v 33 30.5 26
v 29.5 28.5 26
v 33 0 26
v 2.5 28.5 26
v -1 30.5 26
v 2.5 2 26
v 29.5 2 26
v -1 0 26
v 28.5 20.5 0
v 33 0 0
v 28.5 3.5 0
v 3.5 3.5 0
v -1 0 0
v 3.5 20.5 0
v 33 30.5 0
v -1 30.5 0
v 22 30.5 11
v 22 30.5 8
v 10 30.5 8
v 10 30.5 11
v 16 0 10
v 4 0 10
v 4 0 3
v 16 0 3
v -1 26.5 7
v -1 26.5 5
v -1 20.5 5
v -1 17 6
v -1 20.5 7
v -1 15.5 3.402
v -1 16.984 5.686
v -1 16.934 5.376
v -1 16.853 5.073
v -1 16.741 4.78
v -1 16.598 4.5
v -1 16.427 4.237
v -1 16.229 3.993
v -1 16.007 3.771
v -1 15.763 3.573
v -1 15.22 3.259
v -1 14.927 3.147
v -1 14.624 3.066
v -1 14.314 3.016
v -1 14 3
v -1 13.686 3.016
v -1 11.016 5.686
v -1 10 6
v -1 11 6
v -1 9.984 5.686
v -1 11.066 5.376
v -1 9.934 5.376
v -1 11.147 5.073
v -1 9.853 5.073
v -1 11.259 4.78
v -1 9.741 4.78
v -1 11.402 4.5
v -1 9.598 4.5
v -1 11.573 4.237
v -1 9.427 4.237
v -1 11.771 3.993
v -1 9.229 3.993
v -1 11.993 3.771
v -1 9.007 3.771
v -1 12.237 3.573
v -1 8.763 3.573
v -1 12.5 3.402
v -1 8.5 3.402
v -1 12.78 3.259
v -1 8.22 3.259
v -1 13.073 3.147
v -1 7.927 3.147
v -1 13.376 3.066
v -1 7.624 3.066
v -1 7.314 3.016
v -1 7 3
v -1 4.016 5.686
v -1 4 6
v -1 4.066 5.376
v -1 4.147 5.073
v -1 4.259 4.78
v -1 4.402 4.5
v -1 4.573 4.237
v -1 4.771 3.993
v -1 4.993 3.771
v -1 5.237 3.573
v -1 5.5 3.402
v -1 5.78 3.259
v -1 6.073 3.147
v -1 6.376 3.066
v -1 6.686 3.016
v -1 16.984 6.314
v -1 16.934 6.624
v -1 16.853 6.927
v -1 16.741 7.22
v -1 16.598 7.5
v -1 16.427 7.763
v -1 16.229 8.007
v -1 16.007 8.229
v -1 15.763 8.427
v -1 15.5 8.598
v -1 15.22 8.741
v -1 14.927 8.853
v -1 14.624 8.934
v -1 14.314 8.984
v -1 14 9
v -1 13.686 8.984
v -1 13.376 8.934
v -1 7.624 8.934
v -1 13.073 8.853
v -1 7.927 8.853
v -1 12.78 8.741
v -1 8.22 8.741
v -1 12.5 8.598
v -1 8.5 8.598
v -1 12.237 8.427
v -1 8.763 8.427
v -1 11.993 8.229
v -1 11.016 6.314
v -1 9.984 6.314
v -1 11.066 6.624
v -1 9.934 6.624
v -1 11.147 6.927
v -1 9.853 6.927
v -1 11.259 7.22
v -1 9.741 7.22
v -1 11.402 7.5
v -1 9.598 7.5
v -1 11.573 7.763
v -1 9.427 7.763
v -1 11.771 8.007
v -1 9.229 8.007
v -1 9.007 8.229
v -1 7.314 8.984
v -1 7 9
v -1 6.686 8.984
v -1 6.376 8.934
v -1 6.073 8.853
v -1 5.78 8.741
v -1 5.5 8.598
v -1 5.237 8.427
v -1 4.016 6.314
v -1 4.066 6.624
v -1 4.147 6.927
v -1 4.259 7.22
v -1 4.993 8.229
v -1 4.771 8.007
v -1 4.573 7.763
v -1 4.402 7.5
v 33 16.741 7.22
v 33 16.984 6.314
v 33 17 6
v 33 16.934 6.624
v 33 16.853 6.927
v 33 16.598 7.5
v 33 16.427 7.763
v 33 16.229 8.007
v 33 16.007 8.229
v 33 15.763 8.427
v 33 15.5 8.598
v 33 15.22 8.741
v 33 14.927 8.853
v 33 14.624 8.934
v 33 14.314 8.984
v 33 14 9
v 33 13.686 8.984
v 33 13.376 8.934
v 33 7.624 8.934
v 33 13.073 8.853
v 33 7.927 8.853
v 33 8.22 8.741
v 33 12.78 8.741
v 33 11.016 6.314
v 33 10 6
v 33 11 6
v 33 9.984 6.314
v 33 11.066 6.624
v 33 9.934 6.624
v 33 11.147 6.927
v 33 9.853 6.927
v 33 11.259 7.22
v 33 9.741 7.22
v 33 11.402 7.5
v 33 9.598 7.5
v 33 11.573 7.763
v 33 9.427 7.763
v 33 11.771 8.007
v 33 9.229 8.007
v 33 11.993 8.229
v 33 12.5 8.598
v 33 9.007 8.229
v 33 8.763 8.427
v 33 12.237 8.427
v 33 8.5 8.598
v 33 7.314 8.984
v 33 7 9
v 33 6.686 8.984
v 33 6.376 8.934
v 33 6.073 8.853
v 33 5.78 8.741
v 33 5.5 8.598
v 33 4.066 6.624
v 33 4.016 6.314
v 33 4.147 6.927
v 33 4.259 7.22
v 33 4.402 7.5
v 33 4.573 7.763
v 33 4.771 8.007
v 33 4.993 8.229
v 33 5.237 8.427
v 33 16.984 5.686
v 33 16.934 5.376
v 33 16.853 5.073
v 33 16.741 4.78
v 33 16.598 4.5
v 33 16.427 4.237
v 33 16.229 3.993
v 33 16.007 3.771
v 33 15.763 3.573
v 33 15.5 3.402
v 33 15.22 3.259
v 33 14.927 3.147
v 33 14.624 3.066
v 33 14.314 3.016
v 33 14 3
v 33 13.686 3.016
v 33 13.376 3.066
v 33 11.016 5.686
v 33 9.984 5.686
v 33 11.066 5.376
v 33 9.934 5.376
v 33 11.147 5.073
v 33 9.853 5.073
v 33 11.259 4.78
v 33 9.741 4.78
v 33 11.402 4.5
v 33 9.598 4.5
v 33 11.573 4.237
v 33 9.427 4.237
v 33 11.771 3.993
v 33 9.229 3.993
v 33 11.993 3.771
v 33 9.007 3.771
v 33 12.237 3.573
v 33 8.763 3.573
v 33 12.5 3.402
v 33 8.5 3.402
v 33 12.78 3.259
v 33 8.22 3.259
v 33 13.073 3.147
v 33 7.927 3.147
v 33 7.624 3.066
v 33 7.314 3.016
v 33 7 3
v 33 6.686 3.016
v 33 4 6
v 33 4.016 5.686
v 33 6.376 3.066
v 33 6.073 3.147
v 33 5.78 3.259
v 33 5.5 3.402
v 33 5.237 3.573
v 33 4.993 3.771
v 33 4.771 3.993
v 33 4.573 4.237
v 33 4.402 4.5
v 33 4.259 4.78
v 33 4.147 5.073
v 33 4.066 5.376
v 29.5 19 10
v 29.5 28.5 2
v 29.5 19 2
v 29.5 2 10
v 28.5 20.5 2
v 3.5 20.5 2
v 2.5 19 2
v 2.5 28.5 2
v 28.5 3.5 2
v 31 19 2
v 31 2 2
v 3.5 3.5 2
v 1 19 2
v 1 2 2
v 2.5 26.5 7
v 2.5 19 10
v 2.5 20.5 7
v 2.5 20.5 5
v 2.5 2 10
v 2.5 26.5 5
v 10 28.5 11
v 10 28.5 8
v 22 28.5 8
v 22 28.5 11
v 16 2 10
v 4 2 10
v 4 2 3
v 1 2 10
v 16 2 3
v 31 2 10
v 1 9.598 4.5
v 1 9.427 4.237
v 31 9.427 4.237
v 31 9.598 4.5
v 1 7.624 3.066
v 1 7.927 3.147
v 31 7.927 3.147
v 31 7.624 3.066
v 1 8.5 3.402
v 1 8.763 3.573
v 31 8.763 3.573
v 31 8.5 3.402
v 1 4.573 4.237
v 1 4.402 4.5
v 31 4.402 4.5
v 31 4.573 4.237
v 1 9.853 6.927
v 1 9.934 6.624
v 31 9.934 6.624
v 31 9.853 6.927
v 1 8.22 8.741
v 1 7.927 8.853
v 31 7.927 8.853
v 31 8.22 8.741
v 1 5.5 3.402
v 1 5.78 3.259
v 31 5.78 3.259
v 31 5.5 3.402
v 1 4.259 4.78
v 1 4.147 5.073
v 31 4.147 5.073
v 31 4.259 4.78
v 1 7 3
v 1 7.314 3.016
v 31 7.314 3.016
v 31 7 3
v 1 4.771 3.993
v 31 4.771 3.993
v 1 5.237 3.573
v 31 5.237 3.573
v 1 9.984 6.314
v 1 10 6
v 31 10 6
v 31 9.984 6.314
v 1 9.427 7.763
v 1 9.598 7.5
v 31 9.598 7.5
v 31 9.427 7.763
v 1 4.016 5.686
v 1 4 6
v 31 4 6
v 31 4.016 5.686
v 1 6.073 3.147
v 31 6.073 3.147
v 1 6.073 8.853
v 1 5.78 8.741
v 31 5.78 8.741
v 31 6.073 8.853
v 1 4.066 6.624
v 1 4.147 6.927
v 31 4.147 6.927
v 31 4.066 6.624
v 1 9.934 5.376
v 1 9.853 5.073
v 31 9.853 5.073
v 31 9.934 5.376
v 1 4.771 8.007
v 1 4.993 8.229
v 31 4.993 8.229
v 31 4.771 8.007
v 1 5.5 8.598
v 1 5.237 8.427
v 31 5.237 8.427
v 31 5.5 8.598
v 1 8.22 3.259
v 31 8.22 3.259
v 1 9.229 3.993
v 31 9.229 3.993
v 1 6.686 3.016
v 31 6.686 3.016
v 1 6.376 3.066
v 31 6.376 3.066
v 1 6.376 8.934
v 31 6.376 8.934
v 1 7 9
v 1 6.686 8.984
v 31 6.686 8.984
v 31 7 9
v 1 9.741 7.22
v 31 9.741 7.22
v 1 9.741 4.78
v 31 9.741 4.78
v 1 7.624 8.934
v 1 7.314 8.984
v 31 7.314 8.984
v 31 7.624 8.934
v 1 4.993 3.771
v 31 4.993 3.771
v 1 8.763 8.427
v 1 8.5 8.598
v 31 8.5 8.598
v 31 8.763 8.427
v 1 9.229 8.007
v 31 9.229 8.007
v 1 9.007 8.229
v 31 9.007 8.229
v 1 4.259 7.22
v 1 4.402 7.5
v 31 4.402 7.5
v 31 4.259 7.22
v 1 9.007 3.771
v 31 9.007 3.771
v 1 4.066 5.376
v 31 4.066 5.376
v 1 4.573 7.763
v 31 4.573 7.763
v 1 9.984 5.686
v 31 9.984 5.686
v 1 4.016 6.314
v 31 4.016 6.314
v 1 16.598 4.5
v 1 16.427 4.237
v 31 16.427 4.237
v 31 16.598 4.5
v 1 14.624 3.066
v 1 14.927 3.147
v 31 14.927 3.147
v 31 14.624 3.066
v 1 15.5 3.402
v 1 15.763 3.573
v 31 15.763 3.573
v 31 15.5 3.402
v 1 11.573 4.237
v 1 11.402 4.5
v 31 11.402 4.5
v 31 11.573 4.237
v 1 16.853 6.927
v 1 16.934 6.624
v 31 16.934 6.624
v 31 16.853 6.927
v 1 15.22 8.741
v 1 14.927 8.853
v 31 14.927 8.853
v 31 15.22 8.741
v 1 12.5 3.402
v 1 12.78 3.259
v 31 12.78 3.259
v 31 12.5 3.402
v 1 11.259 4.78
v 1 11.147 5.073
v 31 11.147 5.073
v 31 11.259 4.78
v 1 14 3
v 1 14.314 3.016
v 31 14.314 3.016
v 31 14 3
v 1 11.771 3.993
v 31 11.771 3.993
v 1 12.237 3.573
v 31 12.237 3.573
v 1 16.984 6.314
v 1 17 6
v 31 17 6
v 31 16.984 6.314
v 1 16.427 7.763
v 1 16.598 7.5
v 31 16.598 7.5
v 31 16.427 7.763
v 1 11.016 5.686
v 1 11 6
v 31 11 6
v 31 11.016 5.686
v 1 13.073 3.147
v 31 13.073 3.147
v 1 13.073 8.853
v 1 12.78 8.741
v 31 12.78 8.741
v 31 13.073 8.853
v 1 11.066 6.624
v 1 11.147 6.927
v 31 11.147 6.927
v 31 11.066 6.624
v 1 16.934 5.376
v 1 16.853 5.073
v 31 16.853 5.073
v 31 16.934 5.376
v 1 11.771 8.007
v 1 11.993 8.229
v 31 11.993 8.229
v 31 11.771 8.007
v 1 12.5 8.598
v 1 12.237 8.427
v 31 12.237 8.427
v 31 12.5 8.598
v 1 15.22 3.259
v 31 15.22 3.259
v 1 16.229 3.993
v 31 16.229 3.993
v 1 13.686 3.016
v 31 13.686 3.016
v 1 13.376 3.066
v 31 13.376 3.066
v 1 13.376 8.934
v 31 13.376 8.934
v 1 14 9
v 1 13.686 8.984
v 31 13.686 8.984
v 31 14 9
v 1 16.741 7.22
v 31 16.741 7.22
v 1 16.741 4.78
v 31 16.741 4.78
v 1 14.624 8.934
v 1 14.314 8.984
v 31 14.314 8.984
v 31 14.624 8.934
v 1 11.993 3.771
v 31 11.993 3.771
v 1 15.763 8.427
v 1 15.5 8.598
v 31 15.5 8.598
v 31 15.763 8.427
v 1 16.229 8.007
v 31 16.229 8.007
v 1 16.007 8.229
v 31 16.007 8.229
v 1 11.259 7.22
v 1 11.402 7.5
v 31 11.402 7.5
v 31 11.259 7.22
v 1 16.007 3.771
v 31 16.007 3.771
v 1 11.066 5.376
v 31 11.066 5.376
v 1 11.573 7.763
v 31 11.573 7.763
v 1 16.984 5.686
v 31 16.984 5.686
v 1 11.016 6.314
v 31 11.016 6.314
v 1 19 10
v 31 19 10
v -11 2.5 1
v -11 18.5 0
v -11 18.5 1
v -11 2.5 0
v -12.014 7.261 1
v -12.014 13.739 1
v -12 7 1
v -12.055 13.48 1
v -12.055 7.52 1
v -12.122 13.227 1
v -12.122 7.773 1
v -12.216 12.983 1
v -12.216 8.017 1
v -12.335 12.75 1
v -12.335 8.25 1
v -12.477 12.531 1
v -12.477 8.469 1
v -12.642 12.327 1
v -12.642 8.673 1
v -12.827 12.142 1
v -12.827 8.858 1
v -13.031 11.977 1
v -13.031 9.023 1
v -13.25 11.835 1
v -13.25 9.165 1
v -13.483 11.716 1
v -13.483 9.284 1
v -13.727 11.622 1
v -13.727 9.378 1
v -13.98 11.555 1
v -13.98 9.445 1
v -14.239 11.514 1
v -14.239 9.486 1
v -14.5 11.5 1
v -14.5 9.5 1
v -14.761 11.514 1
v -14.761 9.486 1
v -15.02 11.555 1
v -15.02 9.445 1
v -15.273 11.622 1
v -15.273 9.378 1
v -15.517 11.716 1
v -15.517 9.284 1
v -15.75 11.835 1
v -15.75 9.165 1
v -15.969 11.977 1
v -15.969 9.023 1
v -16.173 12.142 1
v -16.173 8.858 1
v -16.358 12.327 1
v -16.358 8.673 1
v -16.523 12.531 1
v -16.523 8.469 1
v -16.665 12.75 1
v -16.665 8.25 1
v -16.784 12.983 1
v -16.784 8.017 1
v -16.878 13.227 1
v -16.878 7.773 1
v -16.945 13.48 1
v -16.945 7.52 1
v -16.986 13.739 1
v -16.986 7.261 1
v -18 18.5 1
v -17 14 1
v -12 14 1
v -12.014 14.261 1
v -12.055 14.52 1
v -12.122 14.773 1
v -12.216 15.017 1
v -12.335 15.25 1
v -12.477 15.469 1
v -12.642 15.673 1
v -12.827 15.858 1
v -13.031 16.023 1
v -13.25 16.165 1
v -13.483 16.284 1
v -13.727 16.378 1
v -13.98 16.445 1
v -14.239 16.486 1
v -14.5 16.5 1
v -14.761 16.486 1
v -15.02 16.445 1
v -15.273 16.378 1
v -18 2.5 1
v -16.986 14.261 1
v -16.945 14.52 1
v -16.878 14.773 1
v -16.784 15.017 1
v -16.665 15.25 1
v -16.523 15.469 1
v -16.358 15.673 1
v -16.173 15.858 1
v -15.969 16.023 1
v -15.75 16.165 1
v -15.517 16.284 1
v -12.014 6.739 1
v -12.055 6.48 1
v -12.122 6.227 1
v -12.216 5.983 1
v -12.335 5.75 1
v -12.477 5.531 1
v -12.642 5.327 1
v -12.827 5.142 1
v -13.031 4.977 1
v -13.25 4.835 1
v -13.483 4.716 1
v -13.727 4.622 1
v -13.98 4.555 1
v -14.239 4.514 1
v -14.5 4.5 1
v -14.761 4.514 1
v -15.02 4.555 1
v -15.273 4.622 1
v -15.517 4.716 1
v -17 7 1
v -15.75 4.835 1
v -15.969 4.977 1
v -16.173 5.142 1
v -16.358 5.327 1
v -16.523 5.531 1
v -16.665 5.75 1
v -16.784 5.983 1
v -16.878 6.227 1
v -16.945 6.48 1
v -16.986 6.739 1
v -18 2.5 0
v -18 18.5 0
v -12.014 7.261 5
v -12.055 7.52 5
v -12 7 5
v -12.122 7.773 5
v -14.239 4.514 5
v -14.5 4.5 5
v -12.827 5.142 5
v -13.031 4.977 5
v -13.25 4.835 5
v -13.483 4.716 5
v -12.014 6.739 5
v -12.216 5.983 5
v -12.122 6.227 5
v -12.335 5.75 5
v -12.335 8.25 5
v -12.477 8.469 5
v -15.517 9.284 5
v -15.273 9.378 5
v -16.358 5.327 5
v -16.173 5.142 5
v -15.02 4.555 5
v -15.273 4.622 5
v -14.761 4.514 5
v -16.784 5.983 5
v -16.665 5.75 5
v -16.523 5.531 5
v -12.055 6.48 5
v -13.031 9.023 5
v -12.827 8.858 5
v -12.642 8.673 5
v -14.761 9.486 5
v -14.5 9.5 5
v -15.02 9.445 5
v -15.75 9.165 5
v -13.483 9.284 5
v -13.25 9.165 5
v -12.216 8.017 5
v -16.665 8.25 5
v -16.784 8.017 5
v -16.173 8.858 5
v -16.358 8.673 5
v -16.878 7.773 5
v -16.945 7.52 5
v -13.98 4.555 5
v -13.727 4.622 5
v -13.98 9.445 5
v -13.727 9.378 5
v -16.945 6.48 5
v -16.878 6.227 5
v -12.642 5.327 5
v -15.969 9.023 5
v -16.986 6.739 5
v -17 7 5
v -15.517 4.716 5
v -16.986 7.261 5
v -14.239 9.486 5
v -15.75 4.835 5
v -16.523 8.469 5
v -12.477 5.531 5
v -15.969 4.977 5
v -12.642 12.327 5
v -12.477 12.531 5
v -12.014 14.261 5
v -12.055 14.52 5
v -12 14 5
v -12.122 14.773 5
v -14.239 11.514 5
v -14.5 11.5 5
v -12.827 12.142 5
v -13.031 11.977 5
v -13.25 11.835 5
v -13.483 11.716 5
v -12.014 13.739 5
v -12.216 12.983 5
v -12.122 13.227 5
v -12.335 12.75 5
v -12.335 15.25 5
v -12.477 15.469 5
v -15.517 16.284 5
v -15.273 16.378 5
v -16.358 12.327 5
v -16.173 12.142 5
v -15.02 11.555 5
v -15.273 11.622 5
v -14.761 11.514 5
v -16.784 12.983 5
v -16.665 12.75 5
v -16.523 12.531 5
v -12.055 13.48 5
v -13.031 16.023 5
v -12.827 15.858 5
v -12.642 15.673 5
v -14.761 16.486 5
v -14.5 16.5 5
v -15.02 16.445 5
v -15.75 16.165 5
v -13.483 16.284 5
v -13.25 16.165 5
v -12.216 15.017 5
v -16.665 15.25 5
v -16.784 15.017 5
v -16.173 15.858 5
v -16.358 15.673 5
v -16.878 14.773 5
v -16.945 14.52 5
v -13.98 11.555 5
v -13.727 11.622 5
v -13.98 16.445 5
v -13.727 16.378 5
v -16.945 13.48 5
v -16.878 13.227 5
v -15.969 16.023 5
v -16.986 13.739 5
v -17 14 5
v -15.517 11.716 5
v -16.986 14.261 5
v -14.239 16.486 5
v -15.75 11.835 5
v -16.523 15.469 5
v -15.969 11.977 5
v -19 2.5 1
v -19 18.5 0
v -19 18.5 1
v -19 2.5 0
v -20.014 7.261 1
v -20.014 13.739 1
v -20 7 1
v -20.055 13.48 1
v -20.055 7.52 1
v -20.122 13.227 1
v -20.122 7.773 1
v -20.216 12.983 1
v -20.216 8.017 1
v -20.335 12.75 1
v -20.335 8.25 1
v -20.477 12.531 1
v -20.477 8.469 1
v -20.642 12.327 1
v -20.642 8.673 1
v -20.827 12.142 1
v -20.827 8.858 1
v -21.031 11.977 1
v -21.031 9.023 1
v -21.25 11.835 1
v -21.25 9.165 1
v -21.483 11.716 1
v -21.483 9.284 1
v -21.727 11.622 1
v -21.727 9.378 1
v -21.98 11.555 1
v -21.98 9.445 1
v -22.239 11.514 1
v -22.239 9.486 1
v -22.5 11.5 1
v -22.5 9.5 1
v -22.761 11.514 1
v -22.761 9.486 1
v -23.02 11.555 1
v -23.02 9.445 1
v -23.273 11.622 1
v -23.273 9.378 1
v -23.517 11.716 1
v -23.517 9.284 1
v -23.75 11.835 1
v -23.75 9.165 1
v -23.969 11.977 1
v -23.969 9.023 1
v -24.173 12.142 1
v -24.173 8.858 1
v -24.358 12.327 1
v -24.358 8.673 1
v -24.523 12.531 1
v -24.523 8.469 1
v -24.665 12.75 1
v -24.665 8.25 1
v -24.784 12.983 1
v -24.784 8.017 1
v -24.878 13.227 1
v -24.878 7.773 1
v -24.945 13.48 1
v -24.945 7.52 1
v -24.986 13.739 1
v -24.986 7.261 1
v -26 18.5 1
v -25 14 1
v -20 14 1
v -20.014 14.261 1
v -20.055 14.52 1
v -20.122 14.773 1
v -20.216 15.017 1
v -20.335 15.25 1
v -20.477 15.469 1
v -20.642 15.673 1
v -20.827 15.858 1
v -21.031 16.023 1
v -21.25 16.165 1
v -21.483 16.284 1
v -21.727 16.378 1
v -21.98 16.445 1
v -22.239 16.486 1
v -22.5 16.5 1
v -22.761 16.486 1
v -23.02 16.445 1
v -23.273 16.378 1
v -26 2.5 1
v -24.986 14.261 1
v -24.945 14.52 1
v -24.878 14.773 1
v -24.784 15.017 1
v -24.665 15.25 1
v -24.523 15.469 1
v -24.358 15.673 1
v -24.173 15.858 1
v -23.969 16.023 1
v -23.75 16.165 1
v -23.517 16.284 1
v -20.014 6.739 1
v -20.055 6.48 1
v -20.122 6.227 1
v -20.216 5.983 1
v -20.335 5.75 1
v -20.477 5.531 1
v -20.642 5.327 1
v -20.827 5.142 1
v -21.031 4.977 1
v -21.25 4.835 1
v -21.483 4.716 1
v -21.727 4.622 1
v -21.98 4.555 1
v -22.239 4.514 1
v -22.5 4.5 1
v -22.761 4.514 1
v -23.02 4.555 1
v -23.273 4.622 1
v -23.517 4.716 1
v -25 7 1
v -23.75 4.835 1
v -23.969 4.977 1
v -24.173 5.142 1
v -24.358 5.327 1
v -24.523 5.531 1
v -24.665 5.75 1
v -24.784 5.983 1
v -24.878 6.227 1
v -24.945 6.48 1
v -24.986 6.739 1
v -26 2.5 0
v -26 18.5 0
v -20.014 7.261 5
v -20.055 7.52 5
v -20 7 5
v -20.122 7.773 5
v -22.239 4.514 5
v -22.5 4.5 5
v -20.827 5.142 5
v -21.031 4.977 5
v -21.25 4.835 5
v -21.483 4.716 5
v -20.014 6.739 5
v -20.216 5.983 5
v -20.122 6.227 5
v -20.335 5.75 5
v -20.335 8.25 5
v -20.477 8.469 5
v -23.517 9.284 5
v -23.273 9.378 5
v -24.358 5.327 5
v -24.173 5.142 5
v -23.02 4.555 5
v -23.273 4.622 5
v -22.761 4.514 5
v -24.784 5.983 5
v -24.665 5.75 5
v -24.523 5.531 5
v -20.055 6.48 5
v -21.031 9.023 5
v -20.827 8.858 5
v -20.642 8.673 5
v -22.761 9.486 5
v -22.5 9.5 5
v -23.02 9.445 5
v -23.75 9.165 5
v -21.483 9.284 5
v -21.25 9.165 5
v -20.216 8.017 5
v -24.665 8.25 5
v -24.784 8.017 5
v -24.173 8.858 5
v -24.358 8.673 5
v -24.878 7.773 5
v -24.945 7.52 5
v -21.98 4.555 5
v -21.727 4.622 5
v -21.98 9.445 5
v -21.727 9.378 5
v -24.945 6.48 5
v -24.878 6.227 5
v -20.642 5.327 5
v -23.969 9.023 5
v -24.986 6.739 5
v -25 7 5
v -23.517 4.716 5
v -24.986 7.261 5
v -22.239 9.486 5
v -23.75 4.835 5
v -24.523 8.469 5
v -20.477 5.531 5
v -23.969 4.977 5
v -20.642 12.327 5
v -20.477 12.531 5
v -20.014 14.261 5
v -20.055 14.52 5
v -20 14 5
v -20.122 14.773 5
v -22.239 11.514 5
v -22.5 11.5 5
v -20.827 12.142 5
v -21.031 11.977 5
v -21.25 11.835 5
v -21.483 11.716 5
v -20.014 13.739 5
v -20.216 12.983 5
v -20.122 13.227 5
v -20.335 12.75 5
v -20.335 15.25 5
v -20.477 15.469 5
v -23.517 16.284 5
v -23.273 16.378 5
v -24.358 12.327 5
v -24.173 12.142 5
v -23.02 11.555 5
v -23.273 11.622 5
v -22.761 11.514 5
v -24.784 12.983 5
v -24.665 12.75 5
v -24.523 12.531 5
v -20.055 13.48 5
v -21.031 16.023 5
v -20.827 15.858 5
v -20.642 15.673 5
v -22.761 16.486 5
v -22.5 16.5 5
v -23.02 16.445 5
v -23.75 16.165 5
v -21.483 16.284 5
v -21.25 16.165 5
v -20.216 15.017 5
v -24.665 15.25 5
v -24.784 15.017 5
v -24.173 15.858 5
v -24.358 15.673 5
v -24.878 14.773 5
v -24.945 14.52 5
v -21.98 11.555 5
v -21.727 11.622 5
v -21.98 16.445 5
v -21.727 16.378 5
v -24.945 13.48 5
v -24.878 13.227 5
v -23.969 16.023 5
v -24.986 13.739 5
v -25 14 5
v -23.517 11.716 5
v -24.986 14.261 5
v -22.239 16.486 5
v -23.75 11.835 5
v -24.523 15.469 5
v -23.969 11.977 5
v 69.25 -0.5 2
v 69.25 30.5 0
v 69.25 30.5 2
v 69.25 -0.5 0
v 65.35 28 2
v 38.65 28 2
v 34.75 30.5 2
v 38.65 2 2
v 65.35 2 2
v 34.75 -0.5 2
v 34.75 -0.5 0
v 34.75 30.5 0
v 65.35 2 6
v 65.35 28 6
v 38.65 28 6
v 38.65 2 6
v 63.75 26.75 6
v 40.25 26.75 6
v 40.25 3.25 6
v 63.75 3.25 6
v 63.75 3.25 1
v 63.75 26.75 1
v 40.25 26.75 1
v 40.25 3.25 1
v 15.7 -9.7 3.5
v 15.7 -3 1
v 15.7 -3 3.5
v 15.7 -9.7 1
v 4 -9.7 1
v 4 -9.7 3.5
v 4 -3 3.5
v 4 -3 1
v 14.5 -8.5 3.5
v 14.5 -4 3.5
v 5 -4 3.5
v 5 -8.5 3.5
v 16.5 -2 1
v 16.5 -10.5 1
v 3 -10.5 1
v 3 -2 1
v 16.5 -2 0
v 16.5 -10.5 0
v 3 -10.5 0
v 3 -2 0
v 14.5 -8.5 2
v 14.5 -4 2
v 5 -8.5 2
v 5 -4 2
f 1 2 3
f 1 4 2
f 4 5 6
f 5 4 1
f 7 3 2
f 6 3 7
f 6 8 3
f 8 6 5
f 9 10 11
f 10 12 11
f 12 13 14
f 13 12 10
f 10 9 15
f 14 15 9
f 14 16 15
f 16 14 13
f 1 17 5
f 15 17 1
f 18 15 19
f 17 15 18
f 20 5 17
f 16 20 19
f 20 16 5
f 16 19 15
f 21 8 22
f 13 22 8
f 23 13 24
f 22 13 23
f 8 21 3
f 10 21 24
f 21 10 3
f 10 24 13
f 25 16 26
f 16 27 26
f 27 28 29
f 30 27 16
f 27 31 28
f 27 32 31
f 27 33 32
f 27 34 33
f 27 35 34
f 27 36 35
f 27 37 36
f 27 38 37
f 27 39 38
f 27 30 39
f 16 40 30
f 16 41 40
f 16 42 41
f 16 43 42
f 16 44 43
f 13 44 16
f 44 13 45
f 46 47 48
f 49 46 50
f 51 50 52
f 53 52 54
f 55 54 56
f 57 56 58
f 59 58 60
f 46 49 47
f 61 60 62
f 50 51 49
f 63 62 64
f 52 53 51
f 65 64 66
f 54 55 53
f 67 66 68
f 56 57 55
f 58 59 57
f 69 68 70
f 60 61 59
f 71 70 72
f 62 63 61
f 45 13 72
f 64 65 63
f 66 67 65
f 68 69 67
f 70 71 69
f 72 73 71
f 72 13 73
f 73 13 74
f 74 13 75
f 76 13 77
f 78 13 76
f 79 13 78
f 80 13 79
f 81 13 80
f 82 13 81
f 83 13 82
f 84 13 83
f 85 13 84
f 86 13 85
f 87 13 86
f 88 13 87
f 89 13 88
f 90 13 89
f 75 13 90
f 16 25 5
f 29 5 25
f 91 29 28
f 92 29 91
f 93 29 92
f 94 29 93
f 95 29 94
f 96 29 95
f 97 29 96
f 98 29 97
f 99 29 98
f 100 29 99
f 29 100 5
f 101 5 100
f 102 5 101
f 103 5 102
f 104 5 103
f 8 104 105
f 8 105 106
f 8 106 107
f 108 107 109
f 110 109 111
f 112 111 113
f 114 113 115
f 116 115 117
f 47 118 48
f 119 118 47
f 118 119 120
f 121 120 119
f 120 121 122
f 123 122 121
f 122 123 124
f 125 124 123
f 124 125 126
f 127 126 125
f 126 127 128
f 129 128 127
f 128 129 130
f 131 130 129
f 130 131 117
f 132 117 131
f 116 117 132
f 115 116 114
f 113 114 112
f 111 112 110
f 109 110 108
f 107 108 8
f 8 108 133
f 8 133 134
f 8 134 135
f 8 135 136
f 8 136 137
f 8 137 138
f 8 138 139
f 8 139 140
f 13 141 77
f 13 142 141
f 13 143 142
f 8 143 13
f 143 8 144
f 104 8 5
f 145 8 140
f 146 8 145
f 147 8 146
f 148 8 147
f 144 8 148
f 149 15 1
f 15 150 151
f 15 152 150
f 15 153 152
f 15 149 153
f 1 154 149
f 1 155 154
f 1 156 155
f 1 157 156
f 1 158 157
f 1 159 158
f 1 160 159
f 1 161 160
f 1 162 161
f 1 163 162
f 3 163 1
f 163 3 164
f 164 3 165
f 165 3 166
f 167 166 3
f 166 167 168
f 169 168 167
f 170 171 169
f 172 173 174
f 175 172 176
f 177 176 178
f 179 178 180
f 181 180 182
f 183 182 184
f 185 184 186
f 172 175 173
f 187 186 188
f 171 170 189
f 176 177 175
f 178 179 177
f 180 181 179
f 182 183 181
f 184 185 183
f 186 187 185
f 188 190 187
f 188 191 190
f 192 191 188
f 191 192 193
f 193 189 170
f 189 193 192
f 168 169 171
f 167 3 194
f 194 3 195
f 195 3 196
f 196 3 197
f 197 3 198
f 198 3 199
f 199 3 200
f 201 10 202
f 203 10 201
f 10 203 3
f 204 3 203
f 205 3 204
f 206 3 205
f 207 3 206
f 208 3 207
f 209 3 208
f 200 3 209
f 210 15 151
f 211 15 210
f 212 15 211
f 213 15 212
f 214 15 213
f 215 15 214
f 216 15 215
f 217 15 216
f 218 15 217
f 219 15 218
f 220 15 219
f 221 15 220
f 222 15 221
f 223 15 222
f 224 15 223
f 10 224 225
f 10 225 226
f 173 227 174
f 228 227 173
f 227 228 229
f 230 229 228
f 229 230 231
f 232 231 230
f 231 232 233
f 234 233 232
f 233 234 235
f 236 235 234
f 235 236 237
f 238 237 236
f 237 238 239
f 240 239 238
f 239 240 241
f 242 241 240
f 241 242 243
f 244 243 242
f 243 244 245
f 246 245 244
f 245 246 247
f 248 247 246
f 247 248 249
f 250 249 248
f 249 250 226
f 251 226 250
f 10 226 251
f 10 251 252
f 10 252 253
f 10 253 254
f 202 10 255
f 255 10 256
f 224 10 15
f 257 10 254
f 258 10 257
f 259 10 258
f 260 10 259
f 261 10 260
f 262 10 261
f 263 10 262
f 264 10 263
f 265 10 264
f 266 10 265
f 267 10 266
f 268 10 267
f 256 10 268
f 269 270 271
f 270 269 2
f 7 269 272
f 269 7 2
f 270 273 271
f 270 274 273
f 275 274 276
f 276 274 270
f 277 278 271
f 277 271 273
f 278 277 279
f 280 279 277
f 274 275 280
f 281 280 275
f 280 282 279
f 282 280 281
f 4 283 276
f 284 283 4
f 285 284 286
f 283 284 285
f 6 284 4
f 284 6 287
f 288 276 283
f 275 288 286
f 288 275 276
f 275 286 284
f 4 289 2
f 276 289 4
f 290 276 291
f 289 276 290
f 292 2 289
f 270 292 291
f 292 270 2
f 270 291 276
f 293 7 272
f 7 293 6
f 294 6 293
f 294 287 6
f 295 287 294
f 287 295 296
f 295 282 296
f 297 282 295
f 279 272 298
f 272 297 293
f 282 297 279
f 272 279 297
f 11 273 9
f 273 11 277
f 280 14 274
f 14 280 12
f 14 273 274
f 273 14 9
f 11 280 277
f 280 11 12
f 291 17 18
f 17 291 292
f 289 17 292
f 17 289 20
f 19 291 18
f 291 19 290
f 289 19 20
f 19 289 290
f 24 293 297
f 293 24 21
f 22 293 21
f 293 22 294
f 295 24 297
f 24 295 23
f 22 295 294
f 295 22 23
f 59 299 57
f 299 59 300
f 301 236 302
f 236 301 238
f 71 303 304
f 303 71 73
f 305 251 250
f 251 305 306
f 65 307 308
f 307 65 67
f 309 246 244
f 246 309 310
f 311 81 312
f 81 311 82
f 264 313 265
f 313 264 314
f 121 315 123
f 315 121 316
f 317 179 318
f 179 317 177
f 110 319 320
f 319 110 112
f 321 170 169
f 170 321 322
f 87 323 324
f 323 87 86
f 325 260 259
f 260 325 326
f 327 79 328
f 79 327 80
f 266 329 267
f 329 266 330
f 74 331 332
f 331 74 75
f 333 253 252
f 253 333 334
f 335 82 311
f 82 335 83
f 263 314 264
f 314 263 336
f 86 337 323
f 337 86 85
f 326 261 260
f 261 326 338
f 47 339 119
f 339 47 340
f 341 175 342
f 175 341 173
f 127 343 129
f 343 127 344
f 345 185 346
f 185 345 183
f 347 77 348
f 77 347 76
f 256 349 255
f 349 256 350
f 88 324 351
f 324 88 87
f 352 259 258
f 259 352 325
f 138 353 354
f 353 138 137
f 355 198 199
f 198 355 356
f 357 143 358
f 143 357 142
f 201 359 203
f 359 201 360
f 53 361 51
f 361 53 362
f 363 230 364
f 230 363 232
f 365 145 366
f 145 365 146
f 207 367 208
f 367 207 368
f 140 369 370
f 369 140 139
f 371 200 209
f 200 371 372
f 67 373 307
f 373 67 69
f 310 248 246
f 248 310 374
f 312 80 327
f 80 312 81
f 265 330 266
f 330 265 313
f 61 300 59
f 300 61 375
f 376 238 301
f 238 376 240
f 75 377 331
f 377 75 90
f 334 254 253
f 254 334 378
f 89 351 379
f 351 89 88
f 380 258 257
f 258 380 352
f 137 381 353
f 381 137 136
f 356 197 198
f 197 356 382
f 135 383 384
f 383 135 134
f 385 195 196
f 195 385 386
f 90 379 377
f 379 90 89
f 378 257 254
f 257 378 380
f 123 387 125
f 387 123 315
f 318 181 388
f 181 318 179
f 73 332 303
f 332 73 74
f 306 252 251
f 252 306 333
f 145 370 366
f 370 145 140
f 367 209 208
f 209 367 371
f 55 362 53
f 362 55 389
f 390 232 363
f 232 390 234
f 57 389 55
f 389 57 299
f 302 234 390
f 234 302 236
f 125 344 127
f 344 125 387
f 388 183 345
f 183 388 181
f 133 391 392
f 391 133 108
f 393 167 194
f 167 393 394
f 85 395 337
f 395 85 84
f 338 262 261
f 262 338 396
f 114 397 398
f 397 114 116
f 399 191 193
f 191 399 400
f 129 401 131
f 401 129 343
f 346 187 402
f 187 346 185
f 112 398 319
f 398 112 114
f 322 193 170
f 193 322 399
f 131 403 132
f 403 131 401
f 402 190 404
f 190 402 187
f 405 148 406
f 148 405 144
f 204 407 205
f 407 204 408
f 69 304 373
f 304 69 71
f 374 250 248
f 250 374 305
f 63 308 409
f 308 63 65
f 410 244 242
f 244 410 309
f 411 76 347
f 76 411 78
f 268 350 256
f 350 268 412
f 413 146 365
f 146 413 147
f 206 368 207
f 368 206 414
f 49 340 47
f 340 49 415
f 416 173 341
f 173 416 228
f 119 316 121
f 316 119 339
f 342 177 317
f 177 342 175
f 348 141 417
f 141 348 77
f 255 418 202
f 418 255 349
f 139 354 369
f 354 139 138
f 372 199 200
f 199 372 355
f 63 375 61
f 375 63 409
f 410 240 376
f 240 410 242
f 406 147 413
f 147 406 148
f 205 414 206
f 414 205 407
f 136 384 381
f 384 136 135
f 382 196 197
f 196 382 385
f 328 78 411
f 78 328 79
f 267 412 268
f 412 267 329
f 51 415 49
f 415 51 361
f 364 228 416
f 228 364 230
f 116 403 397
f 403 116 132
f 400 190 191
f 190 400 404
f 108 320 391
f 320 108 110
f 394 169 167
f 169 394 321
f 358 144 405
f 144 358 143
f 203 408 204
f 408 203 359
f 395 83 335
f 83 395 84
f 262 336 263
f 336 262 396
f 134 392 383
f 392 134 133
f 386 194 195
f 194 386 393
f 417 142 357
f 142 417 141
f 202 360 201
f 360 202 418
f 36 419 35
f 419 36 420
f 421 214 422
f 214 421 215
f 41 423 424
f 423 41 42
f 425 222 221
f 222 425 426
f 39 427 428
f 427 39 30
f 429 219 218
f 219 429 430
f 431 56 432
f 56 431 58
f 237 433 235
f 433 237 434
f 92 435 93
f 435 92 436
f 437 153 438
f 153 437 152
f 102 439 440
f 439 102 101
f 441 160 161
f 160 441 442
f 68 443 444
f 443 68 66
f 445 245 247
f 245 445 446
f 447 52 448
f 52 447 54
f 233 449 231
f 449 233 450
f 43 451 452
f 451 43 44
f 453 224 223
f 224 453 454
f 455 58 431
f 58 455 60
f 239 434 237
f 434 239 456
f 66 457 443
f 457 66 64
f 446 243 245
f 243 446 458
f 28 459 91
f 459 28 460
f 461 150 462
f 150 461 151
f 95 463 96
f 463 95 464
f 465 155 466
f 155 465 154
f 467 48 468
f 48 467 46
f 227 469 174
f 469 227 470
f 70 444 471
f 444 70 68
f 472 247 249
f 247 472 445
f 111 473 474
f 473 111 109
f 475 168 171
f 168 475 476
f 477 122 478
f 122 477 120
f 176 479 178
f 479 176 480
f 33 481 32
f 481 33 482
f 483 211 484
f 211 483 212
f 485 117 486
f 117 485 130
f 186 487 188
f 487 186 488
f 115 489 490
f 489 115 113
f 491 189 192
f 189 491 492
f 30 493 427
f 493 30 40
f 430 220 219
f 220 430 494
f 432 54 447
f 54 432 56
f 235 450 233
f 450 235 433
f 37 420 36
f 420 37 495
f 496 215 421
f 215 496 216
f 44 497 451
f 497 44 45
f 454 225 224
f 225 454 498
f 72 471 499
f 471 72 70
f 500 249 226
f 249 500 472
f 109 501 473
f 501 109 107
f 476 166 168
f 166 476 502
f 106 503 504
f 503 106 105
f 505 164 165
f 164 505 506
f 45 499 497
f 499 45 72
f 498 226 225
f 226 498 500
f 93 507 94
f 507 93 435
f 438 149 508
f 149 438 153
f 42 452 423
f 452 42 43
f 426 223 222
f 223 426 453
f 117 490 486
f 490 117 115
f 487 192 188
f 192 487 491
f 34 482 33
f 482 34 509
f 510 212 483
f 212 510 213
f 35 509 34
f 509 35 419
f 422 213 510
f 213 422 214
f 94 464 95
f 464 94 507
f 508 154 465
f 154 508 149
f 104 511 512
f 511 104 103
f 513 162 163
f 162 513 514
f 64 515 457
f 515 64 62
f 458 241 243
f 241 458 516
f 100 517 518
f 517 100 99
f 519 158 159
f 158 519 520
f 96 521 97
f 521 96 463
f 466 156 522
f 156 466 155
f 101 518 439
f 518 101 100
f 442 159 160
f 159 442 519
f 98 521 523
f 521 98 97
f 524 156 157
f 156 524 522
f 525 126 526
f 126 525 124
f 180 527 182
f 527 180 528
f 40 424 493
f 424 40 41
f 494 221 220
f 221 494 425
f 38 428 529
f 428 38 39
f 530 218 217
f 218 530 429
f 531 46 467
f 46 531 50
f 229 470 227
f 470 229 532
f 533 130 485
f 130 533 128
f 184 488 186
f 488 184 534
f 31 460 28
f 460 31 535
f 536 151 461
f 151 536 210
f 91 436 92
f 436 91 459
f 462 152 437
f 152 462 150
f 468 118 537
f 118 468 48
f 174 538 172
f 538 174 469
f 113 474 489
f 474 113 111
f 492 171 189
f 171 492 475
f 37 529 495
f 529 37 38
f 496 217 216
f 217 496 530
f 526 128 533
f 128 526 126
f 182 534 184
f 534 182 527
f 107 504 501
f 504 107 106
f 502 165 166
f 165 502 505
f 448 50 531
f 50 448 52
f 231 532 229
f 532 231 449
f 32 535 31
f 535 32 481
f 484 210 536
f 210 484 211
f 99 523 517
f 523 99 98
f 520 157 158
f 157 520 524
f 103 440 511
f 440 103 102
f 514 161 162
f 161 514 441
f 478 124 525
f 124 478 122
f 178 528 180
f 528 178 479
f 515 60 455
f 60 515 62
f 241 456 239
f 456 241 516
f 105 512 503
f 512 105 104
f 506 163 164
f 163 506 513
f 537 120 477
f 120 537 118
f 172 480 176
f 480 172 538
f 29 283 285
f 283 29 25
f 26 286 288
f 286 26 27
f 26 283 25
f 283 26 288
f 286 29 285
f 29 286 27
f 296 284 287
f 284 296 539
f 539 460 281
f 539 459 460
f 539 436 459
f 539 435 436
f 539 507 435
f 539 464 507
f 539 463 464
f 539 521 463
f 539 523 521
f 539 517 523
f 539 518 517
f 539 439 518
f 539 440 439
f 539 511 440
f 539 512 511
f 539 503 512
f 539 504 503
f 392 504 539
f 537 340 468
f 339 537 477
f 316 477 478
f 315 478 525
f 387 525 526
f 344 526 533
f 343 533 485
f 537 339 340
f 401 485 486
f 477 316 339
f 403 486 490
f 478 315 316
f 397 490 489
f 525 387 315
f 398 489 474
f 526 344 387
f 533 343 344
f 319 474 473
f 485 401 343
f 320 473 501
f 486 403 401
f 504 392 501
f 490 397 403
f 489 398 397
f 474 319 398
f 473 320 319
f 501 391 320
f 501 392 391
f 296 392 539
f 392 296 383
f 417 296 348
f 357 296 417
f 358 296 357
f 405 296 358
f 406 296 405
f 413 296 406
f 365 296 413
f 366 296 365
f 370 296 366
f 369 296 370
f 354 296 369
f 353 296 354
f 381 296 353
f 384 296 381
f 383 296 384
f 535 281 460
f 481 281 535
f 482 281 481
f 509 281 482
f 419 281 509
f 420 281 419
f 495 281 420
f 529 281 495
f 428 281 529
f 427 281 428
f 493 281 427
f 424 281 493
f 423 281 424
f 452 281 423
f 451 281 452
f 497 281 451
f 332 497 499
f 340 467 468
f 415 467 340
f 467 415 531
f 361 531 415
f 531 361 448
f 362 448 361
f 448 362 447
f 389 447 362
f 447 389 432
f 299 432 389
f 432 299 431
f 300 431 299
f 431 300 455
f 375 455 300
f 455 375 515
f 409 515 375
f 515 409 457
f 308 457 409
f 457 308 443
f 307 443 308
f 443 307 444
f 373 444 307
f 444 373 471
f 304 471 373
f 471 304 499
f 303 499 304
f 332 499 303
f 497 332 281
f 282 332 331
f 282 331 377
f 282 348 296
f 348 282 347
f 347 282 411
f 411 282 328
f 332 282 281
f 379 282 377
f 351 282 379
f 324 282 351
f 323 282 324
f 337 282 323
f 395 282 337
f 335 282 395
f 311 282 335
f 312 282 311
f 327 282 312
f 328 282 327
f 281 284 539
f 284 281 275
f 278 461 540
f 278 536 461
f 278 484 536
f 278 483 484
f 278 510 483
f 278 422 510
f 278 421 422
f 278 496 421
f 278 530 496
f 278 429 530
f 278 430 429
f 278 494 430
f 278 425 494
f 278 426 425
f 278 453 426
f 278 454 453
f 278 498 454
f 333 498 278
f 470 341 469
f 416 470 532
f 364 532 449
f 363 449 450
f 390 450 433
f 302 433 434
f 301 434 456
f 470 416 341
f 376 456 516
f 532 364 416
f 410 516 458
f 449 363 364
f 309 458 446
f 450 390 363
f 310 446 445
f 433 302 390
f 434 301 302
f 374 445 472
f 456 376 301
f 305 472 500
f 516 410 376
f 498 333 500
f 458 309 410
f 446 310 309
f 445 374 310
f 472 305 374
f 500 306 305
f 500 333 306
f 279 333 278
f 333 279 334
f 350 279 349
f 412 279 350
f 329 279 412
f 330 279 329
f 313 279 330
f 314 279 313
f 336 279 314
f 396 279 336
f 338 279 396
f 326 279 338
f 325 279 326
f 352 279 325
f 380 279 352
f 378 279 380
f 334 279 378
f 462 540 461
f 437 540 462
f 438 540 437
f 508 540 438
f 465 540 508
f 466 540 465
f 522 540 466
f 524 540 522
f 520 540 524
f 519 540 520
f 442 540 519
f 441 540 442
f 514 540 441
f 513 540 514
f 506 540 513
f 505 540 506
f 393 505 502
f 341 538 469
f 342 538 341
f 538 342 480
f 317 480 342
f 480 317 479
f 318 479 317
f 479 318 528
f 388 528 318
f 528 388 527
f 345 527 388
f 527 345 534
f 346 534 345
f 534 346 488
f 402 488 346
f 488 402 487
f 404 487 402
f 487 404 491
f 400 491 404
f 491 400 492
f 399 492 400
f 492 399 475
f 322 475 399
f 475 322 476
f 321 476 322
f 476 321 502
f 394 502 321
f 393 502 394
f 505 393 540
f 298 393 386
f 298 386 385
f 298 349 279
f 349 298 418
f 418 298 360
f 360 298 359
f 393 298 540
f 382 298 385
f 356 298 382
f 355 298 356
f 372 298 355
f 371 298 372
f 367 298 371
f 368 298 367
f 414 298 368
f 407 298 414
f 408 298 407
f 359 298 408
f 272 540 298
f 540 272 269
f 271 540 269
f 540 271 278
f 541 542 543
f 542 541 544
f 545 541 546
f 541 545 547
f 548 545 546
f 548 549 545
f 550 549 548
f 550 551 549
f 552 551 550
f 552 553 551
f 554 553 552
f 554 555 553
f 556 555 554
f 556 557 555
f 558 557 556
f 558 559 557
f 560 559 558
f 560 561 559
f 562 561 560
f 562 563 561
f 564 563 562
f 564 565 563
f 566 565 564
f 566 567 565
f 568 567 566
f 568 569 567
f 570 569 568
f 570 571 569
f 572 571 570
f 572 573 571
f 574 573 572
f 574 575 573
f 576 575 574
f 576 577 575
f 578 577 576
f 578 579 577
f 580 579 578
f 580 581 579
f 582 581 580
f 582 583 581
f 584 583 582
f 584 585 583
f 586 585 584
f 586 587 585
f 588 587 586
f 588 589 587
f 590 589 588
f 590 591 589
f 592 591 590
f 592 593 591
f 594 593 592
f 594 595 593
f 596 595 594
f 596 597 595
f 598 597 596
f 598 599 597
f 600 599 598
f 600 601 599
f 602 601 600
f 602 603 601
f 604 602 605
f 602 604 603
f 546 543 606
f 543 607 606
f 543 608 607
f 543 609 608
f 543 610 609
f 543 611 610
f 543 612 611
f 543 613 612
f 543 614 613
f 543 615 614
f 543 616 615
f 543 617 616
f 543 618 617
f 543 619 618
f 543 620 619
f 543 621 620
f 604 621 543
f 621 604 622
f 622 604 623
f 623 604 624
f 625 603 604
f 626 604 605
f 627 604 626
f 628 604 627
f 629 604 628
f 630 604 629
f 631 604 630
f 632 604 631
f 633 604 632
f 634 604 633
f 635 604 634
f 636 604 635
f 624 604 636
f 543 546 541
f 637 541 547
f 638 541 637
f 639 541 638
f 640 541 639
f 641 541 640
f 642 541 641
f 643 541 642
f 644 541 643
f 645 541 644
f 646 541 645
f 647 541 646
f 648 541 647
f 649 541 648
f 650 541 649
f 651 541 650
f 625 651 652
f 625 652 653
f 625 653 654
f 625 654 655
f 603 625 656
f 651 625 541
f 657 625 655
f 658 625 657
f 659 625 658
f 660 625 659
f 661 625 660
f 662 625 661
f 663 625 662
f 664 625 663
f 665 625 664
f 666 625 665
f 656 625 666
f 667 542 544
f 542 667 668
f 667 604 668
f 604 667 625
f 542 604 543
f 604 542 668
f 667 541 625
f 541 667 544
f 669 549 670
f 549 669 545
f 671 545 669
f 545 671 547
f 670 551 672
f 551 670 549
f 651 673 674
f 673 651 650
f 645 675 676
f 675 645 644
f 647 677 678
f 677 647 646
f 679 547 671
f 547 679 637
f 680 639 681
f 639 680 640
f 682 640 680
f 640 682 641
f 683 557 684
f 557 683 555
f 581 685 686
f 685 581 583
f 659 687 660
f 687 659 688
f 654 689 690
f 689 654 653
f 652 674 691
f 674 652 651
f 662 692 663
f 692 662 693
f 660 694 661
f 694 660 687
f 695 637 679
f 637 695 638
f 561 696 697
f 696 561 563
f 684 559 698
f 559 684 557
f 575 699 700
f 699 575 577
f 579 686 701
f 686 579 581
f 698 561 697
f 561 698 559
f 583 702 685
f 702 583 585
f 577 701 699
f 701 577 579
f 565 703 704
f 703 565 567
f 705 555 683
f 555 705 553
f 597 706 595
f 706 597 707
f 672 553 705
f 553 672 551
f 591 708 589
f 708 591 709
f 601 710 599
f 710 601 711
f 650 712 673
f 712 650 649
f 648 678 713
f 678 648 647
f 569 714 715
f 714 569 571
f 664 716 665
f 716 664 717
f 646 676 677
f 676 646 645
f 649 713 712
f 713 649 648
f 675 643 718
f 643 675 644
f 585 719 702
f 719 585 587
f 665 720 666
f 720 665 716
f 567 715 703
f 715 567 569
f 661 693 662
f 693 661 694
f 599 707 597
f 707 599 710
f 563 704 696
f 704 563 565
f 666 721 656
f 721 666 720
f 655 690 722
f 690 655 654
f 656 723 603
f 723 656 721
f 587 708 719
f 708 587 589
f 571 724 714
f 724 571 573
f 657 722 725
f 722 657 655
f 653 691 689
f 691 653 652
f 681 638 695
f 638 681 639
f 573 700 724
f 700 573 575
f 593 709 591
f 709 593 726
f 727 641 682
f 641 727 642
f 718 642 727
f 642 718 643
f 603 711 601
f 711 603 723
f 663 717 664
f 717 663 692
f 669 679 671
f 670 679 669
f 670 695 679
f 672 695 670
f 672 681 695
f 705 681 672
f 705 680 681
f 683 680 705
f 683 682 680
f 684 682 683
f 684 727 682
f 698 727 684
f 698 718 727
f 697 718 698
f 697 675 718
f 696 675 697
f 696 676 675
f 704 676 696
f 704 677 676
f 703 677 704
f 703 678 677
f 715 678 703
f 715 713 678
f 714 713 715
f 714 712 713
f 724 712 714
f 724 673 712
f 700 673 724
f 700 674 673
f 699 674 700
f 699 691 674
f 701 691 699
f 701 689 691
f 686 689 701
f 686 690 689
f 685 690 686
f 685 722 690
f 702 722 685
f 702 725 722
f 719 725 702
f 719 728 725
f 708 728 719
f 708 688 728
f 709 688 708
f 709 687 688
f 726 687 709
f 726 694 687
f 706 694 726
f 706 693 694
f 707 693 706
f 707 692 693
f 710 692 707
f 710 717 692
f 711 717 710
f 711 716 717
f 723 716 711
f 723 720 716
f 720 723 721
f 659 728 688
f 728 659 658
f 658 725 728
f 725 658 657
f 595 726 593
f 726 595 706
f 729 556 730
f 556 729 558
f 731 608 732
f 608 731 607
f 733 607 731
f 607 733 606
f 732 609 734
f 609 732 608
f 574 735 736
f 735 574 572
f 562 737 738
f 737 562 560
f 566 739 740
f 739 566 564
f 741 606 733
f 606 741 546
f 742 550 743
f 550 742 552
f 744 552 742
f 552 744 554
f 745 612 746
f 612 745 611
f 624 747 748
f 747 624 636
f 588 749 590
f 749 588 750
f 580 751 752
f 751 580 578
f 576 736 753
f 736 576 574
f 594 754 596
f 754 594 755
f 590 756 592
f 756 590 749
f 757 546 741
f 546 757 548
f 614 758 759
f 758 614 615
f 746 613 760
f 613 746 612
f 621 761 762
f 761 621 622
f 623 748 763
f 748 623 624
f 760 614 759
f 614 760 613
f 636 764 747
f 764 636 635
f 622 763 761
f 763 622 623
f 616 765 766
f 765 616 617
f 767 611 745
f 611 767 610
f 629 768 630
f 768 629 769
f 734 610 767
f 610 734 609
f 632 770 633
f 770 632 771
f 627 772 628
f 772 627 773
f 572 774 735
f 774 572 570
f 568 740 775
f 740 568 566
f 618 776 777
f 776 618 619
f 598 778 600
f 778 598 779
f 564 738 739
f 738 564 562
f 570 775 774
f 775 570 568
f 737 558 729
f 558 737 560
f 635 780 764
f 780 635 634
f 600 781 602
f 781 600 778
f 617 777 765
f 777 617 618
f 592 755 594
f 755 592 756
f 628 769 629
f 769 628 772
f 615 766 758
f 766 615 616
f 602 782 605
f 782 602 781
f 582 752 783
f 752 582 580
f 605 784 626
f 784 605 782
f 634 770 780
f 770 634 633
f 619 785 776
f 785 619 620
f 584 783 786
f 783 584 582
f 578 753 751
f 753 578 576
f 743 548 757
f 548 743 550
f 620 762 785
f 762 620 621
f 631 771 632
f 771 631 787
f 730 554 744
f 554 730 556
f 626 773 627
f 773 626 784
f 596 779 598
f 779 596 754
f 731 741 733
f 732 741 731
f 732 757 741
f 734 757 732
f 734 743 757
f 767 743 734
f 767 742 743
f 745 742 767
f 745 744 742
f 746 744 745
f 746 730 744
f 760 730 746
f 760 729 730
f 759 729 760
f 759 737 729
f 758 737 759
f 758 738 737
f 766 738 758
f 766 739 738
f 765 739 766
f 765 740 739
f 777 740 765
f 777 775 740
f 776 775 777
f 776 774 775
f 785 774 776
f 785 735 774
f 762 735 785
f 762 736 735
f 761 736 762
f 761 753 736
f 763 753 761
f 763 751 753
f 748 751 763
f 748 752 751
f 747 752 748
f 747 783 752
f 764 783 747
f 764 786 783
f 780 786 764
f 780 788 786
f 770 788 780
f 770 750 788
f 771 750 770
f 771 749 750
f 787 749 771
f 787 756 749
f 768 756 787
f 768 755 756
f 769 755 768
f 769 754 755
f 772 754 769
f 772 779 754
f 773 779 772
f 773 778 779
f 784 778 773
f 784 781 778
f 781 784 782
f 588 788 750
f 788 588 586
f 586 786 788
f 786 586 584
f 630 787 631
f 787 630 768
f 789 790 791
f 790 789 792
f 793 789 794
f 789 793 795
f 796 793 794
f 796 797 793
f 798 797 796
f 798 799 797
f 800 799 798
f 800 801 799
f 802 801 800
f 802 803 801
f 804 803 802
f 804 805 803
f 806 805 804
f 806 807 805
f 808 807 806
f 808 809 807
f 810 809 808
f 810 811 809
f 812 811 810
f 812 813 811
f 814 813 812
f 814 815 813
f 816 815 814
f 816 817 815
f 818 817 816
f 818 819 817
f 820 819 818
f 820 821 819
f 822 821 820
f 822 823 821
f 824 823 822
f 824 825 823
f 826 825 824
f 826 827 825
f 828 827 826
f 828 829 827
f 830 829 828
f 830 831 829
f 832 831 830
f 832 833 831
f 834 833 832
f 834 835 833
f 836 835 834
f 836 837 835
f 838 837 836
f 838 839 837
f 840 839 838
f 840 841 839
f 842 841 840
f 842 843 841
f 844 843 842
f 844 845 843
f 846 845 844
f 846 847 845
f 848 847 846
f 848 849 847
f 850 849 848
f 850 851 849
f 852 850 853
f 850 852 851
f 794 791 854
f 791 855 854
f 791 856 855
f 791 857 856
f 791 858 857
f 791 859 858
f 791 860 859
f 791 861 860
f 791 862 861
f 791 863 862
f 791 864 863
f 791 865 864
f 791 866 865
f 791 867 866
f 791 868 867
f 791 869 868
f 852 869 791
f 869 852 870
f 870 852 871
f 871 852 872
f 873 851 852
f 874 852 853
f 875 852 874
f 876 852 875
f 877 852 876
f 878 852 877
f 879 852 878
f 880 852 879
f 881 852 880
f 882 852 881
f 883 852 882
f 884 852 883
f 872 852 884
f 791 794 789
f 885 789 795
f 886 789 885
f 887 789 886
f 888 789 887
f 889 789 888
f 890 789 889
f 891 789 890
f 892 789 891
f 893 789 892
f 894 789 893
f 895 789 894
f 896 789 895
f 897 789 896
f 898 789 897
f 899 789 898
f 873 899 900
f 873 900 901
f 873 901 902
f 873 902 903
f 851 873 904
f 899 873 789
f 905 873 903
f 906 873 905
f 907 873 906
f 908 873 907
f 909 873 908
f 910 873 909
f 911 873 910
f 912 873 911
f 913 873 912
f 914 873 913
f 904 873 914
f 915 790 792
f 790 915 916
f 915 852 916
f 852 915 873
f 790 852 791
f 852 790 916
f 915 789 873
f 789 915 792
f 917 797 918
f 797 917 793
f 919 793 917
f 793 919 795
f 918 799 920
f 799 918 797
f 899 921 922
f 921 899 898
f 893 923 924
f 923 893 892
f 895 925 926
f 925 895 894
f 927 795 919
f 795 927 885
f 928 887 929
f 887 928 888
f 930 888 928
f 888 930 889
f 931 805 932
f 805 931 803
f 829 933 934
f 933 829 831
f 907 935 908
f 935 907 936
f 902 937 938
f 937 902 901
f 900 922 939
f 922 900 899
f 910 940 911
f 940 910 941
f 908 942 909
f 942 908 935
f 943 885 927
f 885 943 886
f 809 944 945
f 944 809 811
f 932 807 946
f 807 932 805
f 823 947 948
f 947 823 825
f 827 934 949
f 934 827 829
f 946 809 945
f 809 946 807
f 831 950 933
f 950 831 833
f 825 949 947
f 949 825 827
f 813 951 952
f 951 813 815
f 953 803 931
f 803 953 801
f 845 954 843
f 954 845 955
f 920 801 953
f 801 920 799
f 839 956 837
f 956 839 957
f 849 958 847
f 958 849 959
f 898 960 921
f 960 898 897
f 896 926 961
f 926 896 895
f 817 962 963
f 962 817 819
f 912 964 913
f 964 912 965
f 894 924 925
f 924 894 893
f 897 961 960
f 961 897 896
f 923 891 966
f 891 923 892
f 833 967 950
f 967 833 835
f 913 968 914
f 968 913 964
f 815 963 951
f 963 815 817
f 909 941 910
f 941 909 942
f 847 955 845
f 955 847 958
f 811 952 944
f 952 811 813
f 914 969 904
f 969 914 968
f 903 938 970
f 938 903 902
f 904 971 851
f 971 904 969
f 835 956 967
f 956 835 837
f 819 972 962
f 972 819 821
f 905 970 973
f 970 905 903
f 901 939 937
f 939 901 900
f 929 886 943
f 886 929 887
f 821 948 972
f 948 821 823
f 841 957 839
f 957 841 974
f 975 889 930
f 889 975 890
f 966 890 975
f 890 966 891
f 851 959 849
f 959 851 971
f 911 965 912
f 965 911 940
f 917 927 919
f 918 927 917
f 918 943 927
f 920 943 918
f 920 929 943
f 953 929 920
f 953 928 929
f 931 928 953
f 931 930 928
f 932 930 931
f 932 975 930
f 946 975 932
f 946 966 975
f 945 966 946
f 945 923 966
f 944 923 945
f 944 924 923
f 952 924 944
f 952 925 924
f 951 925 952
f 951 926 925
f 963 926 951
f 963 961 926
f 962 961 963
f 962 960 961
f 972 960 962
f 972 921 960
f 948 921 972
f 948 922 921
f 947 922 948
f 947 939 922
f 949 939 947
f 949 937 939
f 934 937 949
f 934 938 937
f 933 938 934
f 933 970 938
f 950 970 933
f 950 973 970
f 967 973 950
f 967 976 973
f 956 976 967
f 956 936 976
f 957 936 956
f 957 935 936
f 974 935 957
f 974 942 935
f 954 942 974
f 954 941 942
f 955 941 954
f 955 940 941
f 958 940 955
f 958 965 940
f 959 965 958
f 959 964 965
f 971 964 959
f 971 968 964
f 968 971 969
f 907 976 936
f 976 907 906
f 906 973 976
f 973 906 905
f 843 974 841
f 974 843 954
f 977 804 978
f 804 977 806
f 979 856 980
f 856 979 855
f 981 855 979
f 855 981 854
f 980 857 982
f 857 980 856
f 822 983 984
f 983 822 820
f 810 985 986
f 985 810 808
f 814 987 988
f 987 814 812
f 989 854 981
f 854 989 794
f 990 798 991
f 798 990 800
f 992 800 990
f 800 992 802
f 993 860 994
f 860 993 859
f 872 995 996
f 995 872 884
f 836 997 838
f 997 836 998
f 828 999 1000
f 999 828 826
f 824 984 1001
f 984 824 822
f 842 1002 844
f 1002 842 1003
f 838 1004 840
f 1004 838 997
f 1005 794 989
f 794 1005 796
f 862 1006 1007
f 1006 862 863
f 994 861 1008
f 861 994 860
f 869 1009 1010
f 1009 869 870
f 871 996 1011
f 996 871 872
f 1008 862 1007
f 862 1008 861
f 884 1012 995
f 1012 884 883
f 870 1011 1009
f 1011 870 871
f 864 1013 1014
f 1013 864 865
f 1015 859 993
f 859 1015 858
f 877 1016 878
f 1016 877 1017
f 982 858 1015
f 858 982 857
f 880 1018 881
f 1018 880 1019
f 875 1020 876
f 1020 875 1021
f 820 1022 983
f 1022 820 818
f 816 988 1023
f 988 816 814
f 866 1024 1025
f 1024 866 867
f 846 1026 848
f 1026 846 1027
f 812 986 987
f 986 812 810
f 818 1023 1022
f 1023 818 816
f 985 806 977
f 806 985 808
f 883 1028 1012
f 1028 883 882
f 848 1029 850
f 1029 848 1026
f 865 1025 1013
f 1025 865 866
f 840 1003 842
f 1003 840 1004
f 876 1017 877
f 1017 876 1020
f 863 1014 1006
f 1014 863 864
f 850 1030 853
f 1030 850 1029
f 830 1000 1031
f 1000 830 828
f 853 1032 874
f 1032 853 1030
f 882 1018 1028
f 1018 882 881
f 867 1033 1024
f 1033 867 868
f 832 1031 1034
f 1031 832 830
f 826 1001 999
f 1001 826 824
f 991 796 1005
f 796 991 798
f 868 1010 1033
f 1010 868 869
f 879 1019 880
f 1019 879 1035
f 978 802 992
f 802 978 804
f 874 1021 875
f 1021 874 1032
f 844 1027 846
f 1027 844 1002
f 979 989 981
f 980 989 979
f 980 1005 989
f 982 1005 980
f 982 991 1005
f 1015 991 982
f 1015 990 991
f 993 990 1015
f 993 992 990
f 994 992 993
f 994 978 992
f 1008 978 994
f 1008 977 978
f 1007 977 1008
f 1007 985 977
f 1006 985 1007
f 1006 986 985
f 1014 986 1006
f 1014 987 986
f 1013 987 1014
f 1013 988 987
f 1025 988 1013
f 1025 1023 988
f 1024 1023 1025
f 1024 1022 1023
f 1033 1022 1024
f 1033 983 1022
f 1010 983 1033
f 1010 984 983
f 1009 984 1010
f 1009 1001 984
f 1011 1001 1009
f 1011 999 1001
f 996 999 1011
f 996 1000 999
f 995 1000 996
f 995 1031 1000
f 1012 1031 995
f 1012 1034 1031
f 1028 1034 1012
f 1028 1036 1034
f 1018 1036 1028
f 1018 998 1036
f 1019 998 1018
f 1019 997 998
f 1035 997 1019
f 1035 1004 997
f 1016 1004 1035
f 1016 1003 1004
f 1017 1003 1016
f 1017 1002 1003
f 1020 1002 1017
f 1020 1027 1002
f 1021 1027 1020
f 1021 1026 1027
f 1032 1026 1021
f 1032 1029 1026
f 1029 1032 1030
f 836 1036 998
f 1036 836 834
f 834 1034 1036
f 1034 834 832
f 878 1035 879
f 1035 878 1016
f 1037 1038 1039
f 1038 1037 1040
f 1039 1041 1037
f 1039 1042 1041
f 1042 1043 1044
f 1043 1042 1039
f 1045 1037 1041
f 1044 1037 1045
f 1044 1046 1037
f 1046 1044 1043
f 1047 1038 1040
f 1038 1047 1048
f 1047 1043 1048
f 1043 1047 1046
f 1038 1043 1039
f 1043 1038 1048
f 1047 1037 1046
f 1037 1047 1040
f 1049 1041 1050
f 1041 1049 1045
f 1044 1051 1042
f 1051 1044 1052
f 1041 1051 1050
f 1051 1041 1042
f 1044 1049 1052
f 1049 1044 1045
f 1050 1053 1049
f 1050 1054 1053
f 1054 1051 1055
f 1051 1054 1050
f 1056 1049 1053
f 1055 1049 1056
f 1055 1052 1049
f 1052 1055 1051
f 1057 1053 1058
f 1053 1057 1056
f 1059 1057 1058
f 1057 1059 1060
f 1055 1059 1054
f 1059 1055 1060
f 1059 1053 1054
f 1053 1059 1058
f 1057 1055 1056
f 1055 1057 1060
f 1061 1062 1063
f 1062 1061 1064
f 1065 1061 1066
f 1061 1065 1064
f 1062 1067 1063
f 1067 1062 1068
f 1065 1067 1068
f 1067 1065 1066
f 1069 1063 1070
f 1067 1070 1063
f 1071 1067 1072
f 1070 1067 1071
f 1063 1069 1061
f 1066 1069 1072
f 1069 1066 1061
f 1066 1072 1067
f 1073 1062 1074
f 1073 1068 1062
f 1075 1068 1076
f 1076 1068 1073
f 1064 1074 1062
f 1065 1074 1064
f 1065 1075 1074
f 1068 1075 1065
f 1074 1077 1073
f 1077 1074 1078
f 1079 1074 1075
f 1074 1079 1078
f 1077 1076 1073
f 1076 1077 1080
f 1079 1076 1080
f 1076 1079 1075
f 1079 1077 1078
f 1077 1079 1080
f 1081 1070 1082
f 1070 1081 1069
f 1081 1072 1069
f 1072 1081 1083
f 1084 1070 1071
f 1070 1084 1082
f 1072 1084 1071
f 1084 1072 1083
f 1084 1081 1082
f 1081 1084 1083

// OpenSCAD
box = 1;
lid = 1;
usbstopper = 1;
buttons1 = 1;
buttons2 = 1;

if(box==1)
{
//main box
difference()
{
//main shell   
union(){    
cube([32,30.5,26],center=false);
translate([-1,0,0])cube([1.5,30.5,26],center=false);
translate([31,0,0])cube([2,30.5,26],center=false);

}
//internal space
translate([2.5,2,2])cube([27,26.5,24],center=false);
//window for screen
translate([3.5,3.5,0])cube([25,17,26],center=false);
// SD card slot
translate([10,24,8])cube([12,12,3],center=false);
// USB slot
translate([4,-3,3])cube([12,8,7],center=false);
//buttonhole(lower)
translate([-2,7,6])rotate([0,90,0]) cylinder(h=40,r=3,$fn=60);
//buttonhole(upper)
translate([-2,14,6])rotate([0,90,0]) cylinder(h=40,r=3,$fn=60);
//switch access
translate([-2,20.5,5])cube([8,6,2],center=false);
//buttoninners
translate([1,2,2])cube([2,17,8],center=false);
translate([29,2,2])cube([2,17,8],center=false);
//sdcard extra space
//translate([8,26,2])cube([16,3,25],center=false);    
}
}


if(buttons1==1)
{
//buttons1
//rotate([0,90,180])translate([-1.5,-21,-2])color("blue")
{
translate([-18,2.5,0])cube([7,16,1],center=false);
translate([-14.5,7,0])cylinder(h=5,r=2.5,$fn=60);
translate([-14.5,14,0])cylinder(h=5,r=2.5,$fn=60);
}
}

if(buttons2==1)
{    
//buttons2
translate([-8,0,0])
{
translate([-18,2.5,0])cube([7,16,1.],center=false);
translate([-14.5,7,0])cylinder(h=5,r=2.5,$fn=60);
translate([-14.5,14,0])cylinder(h=5,r=2.5,$fn=60);
}
}


if(lid==1)
{
//lid
translate([52,15,1])
{
difference()
{
union(){
cube([34.5,31,2],center=true);
translate([0,0,2])cube([26.7,26,4],center=true);
translate([0,0,4])cube([26.7,26,2],center=true);
}
translate([0,0,4])cube([23.5,23.5,8],center=true);
}
}
}

if (usbstopper==1)
{
// USB plug
translate([0,0,9])rotate([90,0,0])
{
difference()
{
union(){
translate([4,-8,3])cube([11.7,2.5,6.7],center=false);
translate([3,-9,2])cube([13.5,1,8.5],center=false);
}
translate([5,-7,4])cube([9.5,5,4.5],center=false);
}
}
}
